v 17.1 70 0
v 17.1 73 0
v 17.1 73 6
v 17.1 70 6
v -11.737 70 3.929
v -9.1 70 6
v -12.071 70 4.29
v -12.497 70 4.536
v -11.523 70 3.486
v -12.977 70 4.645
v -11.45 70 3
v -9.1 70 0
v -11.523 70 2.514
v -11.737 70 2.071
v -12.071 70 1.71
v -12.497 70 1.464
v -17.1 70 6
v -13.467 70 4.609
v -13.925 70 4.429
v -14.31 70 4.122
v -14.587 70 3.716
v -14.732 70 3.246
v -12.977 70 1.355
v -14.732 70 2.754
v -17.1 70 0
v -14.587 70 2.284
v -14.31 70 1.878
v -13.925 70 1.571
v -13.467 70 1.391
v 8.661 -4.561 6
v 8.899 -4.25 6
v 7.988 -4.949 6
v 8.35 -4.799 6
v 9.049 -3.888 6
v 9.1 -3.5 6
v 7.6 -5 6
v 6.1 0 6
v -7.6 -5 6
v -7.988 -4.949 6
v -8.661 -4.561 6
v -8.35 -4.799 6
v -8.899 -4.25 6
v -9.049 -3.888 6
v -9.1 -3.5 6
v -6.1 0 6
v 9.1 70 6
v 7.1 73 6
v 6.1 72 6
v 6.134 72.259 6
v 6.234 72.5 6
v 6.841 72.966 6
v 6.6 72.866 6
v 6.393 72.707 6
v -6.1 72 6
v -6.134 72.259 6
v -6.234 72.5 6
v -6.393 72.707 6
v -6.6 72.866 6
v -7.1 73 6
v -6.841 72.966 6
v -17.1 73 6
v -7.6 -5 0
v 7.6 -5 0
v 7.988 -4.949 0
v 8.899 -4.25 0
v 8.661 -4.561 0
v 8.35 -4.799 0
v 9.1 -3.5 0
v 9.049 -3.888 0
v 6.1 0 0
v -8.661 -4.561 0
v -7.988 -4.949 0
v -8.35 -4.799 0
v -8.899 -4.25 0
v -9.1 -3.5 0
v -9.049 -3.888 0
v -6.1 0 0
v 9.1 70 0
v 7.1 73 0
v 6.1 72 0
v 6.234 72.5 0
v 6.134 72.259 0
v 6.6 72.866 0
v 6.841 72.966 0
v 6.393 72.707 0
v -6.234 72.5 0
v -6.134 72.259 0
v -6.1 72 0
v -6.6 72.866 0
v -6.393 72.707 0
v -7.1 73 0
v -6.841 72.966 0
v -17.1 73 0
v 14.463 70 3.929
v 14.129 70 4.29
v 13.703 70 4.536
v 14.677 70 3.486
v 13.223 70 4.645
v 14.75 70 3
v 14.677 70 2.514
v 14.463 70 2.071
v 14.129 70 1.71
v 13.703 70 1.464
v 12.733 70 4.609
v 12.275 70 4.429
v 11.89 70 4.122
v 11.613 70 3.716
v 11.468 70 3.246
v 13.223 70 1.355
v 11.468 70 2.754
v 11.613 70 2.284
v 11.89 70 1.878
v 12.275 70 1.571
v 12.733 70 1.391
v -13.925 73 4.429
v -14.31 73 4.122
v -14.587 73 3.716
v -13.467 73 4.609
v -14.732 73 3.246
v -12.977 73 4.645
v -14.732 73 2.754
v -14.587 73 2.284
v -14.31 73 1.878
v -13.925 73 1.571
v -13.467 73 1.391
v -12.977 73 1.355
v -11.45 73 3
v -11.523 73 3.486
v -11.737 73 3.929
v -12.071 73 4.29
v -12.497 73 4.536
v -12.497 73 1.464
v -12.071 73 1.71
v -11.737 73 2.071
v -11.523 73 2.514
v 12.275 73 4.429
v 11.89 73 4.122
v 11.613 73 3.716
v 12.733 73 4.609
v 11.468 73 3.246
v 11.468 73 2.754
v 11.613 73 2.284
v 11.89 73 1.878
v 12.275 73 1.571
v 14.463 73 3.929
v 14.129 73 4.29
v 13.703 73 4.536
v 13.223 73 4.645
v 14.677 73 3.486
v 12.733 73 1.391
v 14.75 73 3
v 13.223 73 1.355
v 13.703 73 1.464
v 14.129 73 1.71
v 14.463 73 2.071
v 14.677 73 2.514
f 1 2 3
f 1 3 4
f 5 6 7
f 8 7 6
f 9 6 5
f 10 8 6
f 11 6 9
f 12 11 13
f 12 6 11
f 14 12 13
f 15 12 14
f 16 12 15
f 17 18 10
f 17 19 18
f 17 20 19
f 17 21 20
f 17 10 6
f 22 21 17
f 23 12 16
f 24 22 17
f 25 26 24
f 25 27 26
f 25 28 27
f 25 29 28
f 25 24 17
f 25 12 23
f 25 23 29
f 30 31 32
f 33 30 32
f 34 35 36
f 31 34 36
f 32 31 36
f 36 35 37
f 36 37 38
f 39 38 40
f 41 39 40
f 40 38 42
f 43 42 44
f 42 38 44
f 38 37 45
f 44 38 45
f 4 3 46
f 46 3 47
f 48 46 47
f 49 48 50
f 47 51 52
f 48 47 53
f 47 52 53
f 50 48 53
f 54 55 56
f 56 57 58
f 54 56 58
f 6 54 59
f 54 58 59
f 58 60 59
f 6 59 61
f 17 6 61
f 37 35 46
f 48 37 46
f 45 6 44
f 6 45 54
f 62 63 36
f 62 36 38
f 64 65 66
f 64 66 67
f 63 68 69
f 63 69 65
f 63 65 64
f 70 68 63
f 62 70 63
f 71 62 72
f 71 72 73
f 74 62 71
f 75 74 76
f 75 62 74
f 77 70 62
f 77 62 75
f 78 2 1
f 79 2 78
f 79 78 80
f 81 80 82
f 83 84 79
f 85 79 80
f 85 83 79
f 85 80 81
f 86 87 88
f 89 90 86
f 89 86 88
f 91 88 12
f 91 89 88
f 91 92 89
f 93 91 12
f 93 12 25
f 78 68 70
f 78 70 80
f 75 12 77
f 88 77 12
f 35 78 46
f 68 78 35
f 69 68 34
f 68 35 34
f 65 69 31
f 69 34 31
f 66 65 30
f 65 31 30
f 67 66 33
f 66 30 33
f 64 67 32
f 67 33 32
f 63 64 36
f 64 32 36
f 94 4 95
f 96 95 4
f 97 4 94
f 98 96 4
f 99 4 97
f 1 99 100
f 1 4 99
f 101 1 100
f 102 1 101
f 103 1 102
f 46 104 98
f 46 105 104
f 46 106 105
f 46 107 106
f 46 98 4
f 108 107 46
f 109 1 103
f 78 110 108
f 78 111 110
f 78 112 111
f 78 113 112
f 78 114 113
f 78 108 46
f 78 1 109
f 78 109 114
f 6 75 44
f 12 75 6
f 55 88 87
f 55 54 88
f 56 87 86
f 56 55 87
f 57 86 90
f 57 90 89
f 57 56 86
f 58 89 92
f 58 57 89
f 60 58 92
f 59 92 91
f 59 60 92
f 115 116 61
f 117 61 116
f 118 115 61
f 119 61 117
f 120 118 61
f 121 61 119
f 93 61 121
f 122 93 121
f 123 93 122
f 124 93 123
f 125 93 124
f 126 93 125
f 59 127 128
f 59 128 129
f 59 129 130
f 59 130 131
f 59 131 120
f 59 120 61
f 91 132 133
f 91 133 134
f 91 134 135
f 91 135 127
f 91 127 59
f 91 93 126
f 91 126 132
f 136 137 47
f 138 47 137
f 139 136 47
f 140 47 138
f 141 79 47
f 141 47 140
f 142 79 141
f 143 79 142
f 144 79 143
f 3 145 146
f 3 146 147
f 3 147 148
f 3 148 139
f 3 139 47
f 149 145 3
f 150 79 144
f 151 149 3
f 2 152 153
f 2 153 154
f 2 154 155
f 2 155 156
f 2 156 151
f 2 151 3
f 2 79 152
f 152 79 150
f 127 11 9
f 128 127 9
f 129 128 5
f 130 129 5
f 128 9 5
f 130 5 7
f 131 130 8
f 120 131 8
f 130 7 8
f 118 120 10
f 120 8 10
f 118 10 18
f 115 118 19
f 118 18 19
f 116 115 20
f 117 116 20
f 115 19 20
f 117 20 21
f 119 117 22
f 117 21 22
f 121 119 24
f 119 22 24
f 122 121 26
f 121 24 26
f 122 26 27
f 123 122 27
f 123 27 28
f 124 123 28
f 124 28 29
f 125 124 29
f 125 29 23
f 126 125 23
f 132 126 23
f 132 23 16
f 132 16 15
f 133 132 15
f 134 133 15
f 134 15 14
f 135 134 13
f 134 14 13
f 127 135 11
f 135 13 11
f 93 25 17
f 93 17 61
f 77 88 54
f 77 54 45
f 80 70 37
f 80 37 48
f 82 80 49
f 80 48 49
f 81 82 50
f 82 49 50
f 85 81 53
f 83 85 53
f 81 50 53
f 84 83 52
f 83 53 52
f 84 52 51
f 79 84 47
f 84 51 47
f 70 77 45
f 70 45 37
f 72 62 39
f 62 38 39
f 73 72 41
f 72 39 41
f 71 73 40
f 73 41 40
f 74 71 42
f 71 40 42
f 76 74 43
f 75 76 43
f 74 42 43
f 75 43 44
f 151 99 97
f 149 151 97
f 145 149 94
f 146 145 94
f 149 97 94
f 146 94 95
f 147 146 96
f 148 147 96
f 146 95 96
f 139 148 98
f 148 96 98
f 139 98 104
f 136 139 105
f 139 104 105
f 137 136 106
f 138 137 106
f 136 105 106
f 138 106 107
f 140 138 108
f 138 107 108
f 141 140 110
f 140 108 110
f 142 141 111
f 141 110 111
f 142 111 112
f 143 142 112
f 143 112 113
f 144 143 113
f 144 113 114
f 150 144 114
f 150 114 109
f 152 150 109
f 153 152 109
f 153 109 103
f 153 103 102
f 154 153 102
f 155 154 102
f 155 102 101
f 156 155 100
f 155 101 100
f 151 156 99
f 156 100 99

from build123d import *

# Parameters (mm, degrees)
BOSS_EXTRUDE5_DEPTH = 6
SKETCH7_R           = 1.65
CUT_EXTRUDE2_DEPTH  = 3
FILLET1_R           = 1
FILLET2_R           = 1.5


with BuildPart() as part:
    # Sketch6 → Boss-Extrude5 (new body)
    with BuildSketch(Plane.XY):
        Polygon((-6.1, 0), (6.1, 0), (6.1, 73), (17.1, 73), (17.1, 70), (9.1, 70), (9.1, -5), (-9.1, -5), (-9.1, 70), (-17.1, 70), (-17.1, 73), (-6.1, 73), align=None)
    extrude(amount=BOSS_EXTRUDE5_DEPTH)

    # Sketch7 → Cut-Extrude2 (cut)
    with BuildSketch(Plane.XZ.offset(-70)):
        with Locations((-13.1, 3)):
            Circle(SKETCH7_R)
        with Locations((13.1, 3)):
            Circle(SKETCH7_R)
    extrude(amount=-CUT_EXTRUDE2_DEPTH, mode=Mode.SUBTRACT)

    # Fillet1
    fillet1_edges = [part.edges().sort_by_distance(p)[0] for p in [
        (6.1, 73, 3),
        (-6.1, 73, 3),
    ]]
    fillet(fillet1_edges, radius=FILLET1_R)

    # Fillet2
    fillet2_edges = [part.edges().sort_by_distance(p)[0] for p in [
        (9.1, -5, 3),
        (-9.1, -5, 3),
    ]]
    fillet(fillet2_edges, radius=FILLET2_R)


solid = part.part
